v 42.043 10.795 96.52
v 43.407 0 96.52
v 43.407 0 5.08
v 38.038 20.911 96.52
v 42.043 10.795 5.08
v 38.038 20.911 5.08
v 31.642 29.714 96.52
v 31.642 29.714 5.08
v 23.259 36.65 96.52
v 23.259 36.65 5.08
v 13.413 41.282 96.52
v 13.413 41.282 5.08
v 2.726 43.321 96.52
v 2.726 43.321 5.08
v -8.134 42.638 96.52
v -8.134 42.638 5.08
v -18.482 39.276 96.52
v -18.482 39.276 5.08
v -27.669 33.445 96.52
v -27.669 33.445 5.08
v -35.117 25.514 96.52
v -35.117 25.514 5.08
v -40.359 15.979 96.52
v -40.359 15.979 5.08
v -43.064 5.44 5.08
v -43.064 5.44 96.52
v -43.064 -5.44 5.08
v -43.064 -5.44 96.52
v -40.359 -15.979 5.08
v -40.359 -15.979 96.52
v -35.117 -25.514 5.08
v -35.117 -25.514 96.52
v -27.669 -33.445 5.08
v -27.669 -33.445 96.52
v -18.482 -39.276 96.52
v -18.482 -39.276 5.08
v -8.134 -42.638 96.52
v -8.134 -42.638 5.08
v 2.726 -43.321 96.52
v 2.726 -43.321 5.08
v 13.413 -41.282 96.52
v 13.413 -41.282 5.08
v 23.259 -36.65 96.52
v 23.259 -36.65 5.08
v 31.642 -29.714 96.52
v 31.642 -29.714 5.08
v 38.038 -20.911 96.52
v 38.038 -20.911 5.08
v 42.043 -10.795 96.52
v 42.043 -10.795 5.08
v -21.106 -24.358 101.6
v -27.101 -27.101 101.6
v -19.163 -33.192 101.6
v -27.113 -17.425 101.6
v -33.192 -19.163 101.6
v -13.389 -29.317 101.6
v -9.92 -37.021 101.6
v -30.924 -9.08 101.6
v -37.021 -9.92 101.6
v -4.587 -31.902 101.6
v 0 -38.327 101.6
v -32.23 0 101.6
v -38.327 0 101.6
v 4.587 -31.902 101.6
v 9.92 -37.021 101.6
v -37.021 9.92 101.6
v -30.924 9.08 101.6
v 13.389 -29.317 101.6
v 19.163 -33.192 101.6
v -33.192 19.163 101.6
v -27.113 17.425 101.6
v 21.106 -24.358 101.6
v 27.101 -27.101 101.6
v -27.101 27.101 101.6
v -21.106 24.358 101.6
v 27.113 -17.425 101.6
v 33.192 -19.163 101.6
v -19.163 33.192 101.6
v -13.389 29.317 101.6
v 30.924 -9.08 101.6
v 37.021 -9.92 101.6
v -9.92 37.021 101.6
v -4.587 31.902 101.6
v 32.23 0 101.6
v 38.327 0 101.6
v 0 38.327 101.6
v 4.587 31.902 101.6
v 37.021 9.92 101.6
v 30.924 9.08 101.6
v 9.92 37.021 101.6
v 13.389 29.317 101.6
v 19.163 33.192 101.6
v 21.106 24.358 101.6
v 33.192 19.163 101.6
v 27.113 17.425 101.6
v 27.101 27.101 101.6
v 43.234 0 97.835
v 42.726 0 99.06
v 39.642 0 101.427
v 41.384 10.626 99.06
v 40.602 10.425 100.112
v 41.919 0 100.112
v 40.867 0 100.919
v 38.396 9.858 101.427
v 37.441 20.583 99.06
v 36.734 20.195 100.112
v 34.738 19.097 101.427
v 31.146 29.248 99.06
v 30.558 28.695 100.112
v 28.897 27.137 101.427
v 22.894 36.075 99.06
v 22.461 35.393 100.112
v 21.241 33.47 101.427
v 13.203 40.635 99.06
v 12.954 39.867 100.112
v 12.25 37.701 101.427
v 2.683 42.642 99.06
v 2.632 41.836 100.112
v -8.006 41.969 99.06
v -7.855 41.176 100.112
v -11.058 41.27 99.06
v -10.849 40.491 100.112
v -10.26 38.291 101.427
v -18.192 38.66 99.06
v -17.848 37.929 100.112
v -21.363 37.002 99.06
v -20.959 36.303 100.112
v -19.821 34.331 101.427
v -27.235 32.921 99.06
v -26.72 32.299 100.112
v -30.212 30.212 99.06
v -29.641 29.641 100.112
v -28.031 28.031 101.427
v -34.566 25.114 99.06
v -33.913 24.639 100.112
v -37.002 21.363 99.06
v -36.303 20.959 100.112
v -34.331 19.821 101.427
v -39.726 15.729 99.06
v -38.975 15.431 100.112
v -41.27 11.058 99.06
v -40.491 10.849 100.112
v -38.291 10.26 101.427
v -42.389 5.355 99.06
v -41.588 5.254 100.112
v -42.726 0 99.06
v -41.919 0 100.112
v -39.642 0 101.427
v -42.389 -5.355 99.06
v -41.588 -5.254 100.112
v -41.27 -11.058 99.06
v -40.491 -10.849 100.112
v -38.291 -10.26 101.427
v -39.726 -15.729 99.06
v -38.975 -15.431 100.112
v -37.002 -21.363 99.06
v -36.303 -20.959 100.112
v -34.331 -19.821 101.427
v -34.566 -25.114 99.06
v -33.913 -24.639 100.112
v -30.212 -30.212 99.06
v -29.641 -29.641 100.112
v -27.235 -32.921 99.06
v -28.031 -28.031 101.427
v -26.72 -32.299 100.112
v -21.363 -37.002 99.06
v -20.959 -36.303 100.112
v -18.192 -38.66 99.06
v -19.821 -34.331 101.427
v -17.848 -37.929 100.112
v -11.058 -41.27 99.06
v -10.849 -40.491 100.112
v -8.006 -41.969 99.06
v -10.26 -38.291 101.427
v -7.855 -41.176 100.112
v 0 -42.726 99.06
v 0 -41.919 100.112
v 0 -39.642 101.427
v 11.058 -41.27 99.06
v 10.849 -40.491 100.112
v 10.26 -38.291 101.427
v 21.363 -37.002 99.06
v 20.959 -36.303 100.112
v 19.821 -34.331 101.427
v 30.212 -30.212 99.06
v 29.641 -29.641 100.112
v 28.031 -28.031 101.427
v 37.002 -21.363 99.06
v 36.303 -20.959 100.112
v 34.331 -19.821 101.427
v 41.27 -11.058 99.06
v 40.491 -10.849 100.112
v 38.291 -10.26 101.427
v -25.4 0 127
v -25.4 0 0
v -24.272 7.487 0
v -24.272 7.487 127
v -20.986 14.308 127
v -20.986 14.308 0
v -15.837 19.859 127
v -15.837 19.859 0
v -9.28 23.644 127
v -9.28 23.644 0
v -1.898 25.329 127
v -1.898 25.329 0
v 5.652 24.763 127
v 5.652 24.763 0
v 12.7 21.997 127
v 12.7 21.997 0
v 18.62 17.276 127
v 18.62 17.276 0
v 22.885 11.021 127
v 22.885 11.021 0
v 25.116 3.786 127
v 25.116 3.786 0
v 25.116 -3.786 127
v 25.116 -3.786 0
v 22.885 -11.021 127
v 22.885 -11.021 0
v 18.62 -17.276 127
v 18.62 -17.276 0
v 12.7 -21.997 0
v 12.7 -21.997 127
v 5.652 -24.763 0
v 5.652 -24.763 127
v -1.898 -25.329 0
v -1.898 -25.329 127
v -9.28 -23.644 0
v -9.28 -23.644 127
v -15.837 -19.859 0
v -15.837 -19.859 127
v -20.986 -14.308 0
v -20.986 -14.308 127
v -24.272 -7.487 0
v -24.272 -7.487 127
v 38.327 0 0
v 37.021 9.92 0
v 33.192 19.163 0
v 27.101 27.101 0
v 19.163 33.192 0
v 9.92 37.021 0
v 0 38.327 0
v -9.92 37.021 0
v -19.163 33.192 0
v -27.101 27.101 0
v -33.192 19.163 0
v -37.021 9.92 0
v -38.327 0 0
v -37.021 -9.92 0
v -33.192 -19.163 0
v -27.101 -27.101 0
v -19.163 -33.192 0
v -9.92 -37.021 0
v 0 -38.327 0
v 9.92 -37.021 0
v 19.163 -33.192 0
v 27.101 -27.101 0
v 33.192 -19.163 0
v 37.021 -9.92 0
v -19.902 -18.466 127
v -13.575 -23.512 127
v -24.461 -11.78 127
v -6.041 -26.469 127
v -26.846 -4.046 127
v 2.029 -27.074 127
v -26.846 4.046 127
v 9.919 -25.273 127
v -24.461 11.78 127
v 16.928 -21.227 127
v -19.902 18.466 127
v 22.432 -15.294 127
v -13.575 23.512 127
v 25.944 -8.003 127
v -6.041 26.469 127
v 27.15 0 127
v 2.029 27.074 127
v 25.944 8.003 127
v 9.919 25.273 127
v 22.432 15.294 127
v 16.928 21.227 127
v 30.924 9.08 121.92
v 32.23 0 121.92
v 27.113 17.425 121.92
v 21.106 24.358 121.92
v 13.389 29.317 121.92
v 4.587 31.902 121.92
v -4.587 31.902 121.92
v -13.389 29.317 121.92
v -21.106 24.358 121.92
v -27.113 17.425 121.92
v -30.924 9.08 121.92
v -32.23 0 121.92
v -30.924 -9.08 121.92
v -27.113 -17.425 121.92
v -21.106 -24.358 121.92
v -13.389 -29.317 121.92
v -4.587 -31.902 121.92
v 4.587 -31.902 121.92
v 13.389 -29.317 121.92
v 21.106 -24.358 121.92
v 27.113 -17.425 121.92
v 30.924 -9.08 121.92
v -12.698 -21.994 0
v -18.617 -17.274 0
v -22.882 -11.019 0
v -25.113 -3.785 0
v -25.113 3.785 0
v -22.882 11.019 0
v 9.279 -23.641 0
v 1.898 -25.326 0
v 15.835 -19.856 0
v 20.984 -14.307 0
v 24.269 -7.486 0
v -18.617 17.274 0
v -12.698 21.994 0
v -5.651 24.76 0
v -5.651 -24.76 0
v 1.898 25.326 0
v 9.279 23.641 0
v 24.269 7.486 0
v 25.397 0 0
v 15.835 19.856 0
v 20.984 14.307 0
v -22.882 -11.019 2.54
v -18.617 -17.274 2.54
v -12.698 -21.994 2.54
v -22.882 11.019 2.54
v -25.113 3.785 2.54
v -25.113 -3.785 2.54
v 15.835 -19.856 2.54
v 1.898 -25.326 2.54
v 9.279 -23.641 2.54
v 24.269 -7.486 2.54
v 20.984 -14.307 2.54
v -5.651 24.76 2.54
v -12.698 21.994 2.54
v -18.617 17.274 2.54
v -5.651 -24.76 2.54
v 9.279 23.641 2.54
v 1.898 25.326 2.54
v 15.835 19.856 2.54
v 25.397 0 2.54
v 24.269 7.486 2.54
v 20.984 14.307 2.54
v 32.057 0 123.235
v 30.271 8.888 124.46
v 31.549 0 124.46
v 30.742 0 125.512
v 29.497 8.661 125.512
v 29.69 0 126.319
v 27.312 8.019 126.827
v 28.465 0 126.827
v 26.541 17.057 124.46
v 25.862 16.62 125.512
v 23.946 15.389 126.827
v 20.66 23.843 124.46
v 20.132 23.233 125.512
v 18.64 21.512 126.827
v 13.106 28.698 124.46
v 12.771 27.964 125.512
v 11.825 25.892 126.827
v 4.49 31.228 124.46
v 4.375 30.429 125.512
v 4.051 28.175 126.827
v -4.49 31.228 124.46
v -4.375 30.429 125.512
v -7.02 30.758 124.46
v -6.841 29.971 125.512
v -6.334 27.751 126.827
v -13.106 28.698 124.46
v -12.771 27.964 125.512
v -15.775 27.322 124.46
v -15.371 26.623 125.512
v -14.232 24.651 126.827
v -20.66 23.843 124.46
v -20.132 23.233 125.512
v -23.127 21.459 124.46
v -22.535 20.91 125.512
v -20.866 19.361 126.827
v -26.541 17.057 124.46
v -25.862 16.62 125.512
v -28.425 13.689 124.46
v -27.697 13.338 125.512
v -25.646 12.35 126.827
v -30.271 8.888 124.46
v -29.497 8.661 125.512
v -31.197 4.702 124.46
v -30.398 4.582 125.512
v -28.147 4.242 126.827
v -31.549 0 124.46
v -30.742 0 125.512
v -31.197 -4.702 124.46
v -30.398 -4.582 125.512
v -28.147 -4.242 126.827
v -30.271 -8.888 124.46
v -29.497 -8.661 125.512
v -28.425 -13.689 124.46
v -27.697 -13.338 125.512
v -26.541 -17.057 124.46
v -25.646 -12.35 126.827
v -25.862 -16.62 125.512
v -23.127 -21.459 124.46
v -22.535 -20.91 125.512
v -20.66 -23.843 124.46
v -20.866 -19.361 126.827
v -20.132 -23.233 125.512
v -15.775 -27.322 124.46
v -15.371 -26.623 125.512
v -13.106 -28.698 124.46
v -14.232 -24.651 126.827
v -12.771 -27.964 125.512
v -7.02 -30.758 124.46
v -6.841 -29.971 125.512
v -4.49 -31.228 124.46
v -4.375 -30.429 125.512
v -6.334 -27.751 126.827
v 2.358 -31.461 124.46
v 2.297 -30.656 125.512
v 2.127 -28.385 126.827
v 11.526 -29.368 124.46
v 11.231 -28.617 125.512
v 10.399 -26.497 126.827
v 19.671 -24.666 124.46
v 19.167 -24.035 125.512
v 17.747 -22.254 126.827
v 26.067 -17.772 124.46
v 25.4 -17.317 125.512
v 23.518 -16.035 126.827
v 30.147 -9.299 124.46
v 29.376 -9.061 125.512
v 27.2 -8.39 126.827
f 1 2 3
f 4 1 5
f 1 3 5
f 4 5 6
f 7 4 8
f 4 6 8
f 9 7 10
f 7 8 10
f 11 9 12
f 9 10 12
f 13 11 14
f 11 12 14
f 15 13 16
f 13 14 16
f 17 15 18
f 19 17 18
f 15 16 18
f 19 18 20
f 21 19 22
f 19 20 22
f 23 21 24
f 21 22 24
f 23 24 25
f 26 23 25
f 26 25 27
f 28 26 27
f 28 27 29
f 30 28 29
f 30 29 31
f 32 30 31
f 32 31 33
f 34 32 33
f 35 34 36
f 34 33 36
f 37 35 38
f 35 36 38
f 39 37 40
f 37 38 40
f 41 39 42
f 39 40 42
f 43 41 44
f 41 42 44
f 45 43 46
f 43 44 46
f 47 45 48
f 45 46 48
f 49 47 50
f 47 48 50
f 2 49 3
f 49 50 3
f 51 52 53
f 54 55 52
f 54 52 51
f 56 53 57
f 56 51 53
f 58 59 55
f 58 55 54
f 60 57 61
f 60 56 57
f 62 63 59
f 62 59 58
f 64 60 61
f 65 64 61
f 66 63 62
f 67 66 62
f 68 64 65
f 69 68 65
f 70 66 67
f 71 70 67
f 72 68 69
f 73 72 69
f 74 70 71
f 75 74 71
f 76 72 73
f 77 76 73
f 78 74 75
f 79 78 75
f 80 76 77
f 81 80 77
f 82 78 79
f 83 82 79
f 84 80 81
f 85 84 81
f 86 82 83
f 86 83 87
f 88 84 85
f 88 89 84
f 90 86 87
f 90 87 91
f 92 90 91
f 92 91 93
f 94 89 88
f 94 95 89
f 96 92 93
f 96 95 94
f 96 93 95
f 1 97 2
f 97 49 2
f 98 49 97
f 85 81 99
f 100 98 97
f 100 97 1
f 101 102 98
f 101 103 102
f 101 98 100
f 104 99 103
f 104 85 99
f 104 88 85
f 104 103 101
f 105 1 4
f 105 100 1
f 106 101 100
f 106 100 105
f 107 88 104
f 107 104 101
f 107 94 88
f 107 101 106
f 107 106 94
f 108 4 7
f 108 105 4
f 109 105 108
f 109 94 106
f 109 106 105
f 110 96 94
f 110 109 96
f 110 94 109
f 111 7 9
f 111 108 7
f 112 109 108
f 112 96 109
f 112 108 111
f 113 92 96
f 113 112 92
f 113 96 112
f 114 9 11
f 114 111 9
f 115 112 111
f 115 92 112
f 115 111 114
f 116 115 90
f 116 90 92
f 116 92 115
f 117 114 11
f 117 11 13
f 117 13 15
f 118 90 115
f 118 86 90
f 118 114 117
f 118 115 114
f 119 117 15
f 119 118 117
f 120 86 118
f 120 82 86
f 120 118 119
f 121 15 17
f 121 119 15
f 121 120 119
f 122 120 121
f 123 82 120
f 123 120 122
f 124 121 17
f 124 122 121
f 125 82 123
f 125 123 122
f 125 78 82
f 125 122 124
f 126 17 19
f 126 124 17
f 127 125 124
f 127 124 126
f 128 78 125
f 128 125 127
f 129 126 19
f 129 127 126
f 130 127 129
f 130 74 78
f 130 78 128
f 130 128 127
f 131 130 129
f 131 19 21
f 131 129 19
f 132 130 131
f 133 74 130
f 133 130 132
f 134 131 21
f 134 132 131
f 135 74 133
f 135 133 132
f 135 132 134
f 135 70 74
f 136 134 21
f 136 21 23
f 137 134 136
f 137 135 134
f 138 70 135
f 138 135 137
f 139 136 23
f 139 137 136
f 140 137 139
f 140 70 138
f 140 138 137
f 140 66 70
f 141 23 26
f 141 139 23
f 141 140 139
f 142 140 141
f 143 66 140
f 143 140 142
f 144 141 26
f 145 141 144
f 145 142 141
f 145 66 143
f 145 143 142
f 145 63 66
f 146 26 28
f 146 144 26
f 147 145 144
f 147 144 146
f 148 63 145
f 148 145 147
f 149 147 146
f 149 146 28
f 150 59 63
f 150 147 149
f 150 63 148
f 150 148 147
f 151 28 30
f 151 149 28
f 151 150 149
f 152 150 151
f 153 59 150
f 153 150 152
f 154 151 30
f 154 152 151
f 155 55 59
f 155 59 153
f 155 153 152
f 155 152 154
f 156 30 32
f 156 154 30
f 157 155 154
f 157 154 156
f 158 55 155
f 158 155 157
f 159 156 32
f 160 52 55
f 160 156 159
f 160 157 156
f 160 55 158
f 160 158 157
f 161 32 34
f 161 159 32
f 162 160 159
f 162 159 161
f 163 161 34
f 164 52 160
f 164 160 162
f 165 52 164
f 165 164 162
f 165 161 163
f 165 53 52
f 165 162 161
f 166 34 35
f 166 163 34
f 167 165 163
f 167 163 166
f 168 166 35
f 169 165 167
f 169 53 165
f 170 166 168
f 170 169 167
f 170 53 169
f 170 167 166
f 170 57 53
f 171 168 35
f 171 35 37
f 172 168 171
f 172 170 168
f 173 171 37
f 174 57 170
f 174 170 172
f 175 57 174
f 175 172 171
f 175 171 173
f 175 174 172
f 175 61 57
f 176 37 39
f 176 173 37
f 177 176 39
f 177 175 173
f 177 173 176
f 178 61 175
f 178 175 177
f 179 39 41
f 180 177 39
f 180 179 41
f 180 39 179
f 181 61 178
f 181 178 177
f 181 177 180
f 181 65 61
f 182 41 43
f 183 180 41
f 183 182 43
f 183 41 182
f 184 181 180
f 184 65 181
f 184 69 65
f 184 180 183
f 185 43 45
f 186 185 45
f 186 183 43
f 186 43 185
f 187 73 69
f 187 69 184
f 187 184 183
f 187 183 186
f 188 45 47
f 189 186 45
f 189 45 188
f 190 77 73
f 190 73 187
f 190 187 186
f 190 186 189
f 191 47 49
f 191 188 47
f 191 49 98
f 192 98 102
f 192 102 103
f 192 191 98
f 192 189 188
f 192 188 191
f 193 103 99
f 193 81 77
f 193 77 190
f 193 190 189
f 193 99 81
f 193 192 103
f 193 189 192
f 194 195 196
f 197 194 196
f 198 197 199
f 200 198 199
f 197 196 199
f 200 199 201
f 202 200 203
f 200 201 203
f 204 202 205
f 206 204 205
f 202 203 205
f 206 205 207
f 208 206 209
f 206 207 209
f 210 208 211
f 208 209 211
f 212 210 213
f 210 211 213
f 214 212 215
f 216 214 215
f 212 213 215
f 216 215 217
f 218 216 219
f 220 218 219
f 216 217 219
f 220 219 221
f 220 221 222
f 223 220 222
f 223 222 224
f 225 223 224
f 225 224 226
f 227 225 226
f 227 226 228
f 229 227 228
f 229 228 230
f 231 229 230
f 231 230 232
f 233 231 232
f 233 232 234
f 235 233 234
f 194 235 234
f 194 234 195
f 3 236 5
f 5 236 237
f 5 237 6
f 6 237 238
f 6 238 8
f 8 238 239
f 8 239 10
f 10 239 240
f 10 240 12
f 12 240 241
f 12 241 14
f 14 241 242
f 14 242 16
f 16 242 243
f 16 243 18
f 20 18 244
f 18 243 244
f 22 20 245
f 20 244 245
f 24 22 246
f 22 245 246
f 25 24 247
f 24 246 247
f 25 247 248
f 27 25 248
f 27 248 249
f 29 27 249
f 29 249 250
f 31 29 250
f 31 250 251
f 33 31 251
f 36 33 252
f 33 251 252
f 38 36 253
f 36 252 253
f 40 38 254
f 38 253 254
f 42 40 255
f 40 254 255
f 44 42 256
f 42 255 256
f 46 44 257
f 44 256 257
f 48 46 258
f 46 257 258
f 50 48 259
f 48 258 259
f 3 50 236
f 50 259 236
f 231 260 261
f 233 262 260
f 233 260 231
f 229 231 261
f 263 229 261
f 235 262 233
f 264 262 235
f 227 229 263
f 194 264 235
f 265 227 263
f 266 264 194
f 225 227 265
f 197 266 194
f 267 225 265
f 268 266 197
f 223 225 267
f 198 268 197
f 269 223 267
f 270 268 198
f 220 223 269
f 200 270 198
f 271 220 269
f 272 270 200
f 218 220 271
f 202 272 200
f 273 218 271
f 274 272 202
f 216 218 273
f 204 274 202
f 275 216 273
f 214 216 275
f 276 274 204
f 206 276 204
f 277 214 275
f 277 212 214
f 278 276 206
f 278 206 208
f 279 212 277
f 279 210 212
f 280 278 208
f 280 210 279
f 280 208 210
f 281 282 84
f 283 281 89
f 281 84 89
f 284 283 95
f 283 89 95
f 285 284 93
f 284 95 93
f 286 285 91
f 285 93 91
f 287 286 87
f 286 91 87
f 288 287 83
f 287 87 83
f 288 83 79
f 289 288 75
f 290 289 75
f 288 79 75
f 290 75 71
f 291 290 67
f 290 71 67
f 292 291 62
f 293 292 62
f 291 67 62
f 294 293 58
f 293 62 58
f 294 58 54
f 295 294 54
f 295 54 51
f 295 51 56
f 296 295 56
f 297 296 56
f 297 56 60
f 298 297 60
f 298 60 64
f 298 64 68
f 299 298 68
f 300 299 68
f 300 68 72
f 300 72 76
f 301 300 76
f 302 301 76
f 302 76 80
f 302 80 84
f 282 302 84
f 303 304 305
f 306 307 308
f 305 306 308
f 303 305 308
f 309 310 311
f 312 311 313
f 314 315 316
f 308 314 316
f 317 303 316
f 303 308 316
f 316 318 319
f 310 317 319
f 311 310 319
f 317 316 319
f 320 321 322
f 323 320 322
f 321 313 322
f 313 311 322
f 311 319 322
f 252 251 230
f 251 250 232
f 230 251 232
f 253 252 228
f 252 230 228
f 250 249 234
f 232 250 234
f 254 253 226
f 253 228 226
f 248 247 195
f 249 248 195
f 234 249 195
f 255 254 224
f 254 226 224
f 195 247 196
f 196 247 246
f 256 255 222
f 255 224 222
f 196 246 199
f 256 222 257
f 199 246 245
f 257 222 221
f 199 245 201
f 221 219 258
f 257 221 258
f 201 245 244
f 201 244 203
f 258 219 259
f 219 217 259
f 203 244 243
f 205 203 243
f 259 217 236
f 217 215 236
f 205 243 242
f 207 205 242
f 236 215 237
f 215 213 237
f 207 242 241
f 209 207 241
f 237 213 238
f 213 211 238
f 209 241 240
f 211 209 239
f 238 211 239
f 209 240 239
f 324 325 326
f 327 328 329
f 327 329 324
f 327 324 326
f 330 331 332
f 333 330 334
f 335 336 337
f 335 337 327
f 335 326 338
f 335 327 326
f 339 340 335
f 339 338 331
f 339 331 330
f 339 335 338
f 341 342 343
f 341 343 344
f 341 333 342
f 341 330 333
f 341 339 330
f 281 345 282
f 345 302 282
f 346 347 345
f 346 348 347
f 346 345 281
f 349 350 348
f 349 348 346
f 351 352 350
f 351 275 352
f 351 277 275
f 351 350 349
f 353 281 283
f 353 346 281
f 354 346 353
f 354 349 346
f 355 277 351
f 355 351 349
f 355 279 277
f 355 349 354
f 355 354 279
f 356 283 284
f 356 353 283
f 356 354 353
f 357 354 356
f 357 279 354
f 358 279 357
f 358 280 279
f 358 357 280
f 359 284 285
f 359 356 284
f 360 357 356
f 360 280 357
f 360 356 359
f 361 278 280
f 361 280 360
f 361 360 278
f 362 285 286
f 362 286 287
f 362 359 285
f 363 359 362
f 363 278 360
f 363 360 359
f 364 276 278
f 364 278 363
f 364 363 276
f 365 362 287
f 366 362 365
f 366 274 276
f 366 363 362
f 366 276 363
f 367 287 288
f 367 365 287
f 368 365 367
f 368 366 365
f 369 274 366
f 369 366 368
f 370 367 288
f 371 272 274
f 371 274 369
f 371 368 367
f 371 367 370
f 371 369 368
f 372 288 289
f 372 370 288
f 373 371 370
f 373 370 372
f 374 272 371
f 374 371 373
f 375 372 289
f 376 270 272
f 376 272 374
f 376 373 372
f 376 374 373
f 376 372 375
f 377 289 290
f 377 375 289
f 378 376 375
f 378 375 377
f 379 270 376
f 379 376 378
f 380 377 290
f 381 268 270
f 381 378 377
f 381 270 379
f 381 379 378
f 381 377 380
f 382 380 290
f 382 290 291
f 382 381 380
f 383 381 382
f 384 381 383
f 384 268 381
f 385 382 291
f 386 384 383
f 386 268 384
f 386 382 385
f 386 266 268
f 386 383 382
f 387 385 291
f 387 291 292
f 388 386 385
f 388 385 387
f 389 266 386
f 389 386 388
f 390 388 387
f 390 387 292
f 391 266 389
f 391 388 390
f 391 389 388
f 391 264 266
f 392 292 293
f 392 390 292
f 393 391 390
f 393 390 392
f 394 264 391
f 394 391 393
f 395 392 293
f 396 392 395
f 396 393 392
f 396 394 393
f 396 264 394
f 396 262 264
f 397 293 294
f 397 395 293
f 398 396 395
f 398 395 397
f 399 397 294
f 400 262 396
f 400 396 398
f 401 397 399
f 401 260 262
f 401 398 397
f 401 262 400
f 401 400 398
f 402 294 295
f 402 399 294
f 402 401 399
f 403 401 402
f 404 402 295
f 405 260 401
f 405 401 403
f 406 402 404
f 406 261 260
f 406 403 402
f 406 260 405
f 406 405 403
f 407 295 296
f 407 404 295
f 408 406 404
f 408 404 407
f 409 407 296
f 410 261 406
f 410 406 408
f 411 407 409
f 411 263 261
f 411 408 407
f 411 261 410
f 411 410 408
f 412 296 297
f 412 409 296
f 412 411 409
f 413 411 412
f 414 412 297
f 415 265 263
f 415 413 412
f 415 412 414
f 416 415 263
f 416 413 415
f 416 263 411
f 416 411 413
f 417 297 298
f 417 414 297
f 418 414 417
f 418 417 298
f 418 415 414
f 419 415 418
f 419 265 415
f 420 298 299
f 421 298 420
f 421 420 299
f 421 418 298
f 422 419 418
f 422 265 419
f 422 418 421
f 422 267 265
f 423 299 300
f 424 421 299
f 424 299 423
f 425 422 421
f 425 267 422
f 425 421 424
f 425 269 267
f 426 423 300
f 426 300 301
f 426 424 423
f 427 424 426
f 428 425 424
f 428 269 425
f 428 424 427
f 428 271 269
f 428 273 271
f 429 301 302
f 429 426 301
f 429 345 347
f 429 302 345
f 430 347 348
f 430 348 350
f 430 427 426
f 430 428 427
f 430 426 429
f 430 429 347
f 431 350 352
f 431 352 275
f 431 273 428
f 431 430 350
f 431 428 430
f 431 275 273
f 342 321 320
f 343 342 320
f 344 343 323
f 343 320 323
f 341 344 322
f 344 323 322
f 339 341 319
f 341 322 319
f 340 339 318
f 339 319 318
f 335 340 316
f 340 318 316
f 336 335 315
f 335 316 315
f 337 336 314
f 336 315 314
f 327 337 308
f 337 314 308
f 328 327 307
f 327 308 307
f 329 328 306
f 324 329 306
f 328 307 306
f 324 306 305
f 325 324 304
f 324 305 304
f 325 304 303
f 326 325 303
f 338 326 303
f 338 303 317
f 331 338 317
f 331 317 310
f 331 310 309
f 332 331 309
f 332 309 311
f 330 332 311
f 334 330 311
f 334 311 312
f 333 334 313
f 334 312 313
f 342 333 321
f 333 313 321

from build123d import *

# Parameters (mm, degrees)
F0_R      = 43.406760719
F0_R_2    = 31.872207378
F1_DEPTH  = 101.6
F2_R      = 32.2297053781
F3_DEPTH  = 127
F4_R      = 21.0037337021
F5_DEPTH  = 132.08
F6_R      = 5.07999
F7_SIZE   = 5.08
F9_D      = 50.8
F10_R     = 25.396952853
F11_DEPTH = 2.54


# Not quite as in the source:
# - a fillet or chamfer is up to 0.001 mm smaller than in the source, because OpenCascade refuses the exact size


with BuildPart() as f1:
    # F0 (on Top) → F1 (new body)
    with BuildSketch(Plane.XY):
        Circle(F0_R)
        Circle(F0_R_2, mode=Mode.SUBTRACT)
    extrude(amount=F1_DEPTH)

    # F2 (on Top) → F3 (join)
    with BuildSketch(Plane.XY):
        Circle(F2_R)
    extrude(amount=F3_DEPTH)

    # F4 (on Top) → F5 (join)
    with BuildSketch(Plane.XY):
        Circle(F4_R)
    extrude(amount=F5_DEPTH)

    # F6 (radius 5.08 in the source; OpenCascade refuses exactly that, so slightly less here)
    f6_edges = [f1.edges().sort_by_distance(p)[0] for p in [
        (-43.406761, 0, 101.6),
        (-32.229705, 0, 127),
        (-21.003734, 0, 132.08),
    ]]
    fillet(f6_edges, radius=F6_R)

    # F7
    f7_edges = [f1.edges().sort_by_distance(p)[0] for p in [
        (-43.406761, 0, 0),
    ]]
    chamfer(f7_edges, length=F7_SIZE)

    # F9 (through all)
    with Locations(Plane.XY.offset(132.08)):
        with Locations((0, 0)):
            Hole(F9_D / 2)


with BuildPart() as f11:
    # F10 (on Top) → F11 (new body)
    with BuildSketch(Plane.XY):
        Circle(F10_R)
    extrude(amount=F11_DEPTH)


solid = Compound([f1.part, f11.part])
